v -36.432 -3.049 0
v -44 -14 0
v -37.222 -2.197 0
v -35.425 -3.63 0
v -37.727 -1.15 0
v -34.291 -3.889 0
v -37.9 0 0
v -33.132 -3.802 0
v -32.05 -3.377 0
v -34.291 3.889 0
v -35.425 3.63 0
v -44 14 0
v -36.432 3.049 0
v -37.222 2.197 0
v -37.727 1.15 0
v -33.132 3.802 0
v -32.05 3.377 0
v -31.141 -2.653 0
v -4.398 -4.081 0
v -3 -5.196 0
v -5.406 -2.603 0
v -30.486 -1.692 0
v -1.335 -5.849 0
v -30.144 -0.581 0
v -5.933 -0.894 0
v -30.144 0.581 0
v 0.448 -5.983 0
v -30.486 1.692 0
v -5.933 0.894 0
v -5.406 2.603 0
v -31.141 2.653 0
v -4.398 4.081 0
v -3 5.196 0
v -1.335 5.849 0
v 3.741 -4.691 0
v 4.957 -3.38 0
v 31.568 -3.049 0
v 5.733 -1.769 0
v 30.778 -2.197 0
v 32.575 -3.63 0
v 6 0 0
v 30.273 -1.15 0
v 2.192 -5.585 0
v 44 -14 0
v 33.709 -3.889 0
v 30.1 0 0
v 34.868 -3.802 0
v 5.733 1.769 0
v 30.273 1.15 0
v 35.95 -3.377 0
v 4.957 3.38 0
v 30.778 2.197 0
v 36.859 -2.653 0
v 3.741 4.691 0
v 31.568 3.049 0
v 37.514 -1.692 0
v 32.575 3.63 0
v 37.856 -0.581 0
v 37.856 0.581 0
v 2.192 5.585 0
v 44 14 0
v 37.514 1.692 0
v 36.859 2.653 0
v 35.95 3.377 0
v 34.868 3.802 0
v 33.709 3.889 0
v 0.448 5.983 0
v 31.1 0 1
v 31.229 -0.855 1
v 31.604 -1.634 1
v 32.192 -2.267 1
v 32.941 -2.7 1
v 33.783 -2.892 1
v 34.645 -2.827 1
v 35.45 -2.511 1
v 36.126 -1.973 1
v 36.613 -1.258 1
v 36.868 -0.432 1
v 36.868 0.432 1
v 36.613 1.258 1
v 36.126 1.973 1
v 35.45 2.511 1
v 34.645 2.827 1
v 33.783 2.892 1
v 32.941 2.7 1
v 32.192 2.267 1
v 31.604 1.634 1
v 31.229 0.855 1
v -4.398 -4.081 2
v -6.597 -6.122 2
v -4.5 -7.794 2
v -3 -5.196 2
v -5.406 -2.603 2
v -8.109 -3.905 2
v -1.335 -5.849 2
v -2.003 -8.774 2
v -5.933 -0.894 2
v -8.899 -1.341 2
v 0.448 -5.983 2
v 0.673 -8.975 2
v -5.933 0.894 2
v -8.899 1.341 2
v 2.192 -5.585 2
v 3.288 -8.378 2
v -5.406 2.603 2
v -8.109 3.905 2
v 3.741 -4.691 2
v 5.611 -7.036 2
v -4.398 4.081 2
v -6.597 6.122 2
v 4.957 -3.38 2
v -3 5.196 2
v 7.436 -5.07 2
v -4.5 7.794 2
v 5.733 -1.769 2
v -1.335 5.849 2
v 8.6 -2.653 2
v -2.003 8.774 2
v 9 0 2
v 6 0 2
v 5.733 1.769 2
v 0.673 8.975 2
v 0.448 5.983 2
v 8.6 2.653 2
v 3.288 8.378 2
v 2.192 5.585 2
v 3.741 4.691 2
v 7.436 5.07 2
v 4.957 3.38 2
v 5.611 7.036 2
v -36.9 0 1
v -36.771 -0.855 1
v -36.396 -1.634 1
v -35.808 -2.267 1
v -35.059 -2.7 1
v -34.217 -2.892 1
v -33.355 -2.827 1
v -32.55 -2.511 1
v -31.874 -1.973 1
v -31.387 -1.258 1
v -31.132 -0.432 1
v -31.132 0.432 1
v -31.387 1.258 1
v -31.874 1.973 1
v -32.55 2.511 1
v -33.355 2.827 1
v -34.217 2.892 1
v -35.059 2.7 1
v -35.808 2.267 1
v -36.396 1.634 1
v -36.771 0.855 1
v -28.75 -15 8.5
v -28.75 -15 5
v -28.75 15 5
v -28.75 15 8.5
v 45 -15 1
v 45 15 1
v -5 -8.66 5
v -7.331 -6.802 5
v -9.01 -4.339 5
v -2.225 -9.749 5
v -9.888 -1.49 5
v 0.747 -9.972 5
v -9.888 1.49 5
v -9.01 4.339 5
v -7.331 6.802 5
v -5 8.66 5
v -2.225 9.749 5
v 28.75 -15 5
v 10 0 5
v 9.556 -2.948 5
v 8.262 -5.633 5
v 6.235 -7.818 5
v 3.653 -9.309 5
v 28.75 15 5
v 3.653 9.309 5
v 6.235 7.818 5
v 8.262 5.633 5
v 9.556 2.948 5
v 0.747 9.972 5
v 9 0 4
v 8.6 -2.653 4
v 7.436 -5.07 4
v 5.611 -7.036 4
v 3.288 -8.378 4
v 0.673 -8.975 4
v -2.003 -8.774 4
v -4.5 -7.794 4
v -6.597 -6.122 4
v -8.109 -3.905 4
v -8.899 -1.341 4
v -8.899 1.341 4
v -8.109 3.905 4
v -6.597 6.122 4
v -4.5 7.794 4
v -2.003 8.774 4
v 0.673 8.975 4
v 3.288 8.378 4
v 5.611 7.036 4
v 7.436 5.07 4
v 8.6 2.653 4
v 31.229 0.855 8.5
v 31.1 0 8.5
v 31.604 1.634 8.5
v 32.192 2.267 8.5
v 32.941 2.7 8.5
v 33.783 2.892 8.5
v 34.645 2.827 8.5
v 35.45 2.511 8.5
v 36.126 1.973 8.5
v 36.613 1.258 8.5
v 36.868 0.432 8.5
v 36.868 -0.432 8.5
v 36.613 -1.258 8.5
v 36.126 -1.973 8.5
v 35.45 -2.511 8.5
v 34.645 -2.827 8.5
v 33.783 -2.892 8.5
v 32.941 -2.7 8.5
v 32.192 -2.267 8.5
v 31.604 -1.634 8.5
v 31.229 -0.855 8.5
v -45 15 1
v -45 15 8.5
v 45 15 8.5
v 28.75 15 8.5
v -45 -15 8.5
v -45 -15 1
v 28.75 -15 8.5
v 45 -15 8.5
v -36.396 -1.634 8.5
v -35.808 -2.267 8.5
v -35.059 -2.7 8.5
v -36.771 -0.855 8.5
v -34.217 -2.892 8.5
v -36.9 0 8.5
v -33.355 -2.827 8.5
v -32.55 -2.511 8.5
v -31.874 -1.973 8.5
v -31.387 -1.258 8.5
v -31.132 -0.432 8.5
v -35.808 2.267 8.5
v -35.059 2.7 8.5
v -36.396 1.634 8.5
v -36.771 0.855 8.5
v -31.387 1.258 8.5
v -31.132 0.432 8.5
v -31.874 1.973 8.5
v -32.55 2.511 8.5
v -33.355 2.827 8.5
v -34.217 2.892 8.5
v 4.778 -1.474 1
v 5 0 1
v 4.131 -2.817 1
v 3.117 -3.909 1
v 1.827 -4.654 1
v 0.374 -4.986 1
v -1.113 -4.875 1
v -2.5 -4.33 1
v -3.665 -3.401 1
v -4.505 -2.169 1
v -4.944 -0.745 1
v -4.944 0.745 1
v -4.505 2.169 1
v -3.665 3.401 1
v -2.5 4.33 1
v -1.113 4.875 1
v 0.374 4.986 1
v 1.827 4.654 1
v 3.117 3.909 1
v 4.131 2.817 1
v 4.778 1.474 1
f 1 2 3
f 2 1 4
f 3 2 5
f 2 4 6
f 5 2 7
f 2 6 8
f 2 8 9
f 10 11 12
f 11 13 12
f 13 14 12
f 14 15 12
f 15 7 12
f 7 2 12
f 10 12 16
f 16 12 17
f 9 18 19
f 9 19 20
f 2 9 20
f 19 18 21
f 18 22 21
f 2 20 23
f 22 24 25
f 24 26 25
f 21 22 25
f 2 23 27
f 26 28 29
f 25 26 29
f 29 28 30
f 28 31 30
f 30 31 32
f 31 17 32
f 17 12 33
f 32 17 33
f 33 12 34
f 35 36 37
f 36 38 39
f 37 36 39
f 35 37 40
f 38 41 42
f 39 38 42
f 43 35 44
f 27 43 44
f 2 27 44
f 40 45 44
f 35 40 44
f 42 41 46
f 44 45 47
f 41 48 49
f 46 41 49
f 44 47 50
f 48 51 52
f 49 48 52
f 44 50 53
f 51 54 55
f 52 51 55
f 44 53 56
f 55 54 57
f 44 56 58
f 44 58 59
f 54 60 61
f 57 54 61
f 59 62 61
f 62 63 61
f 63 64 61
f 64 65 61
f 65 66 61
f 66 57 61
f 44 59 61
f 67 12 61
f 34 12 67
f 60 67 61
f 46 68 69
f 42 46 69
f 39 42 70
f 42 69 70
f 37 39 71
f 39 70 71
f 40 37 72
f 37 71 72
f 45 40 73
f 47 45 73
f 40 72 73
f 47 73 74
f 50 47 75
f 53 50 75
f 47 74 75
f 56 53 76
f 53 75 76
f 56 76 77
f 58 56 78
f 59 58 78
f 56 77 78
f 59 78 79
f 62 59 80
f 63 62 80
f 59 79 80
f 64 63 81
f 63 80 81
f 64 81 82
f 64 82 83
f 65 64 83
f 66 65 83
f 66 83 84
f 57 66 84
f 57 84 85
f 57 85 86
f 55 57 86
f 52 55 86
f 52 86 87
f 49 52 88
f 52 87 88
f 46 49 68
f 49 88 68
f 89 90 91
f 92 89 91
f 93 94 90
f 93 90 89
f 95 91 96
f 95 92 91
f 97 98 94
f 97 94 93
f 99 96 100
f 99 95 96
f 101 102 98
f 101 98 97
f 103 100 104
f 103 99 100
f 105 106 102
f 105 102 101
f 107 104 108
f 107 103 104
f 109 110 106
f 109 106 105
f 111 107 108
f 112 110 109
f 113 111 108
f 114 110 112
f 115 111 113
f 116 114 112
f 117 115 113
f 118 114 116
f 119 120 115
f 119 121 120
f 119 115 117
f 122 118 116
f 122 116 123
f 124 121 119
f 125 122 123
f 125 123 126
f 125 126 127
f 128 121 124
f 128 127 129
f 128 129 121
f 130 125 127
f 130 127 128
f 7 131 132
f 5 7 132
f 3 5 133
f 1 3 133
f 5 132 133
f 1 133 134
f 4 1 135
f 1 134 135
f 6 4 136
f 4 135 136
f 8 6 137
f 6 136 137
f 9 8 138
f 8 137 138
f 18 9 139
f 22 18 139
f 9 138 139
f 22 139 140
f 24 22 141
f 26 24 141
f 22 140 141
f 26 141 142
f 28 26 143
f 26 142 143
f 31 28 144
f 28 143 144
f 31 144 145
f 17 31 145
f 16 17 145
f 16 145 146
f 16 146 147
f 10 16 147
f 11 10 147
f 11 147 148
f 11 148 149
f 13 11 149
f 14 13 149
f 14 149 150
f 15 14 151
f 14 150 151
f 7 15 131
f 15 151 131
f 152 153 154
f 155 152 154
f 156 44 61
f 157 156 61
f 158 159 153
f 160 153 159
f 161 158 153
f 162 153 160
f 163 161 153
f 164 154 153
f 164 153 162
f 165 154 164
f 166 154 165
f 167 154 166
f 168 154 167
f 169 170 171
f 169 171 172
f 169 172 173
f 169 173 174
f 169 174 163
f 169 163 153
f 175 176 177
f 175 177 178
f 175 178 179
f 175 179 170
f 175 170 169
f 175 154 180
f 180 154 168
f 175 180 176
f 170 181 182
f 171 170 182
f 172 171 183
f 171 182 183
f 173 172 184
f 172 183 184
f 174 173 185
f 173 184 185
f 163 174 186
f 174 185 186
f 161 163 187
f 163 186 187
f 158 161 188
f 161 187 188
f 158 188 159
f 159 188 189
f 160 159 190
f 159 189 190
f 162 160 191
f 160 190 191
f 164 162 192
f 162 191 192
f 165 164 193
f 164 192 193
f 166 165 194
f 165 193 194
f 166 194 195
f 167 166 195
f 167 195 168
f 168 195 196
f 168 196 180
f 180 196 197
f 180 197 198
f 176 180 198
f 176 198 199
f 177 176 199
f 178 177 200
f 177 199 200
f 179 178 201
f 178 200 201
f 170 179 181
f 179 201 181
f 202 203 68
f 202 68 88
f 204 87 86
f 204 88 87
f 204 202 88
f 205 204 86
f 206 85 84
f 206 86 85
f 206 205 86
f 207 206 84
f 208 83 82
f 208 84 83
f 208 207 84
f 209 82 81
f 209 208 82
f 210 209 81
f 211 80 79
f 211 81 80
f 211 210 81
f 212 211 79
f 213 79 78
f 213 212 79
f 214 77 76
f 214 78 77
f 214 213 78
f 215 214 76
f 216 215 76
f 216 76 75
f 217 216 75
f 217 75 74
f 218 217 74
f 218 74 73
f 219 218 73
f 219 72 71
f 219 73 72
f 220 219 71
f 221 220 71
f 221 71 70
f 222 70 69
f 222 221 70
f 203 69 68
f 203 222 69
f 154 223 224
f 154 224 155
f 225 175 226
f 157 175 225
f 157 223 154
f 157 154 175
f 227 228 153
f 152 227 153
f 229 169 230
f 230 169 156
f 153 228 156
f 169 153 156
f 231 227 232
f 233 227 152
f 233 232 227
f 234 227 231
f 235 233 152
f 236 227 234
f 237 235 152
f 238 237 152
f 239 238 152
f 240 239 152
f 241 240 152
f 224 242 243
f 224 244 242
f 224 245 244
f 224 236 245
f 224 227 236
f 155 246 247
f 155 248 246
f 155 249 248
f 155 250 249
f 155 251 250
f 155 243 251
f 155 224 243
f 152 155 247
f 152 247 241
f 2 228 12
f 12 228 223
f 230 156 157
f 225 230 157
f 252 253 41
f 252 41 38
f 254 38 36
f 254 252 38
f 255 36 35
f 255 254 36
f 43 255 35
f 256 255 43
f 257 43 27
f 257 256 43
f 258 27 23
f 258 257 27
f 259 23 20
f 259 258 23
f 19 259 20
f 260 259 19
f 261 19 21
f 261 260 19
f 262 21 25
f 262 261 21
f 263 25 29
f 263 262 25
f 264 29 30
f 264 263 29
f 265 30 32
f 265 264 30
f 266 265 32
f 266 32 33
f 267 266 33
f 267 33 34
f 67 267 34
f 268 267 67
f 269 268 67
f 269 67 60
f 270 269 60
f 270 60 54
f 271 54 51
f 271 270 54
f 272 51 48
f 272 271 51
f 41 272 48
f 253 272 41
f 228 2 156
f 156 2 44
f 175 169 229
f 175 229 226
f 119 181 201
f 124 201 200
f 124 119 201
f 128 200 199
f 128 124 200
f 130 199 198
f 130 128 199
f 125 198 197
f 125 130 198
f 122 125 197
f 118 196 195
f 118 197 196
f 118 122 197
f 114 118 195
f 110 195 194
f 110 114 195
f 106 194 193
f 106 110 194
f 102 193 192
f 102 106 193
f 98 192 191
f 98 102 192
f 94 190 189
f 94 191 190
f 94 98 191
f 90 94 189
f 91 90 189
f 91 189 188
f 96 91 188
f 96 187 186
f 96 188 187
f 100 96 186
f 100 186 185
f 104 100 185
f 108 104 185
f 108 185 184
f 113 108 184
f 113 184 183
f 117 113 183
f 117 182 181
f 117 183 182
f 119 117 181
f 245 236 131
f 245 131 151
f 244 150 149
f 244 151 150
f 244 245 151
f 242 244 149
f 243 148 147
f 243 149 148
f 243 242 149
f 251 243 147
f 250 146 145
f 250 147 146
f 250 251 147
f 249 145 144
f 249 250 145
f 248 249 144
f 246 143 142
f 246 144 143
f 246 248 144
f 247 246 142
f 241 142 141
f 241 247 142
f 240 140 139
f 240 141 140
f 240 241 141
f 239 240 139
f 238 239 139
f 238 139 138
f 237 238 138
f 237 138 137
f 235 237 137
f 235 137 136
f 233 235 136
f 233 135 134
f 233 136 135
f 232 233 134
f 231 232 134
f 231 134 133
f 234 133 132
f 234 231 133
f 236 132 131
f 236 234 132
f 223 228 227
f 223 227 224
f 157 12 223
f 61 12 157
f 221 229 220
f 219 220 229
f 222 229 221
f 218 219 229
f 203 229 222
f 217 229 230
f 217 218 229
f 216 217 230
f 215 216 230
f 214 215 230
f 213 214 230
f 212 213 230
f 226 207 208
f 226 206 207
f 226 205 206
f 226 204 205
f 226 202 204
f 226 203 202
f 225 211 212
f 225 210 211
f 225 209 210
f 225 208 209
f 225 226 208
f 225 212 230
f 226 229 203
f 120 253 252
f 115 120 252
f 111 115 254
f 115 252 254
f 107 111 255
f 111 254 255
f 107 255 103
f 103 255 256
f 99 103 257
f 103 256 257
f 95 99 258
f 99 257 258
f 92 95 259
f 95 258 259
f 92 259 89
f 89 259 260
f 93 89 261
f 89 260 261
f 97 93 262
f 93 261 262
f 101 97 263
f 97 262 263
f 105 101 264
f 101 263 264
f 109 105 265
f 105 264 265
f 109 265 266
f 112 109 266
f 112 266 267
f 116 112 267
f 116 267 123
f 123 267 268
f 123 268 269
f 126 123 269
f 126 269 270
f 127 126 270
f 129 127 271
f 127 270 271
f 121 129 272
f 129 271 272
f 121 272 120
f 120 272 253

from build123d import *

# Parameters (mm, degrees)
SKETCH_1_W               = 90
SKETCH_1_H               = 30
EXTRUDE_1_DEPTH          = 5
SKETCH_2_W               = 16.25
SKETCH_2_H               = 30
EXTRUDE_2_DEPTH          = 3.5
CUT_EXTRUDE_1_DEPTH      = 49.189729196
CUT_EXTRUDE_1_DEPTH_BACK = 49.189729196
SKETCH_3_R               = 2.9
CHAMFER_1_SIZE           = 1
CUT_EXTRUDE_2_DEPTH      = 48.696960071
CUT_EXTRUDE_2_DEPTH_BACK = 3
SKETCH_4_R               = 9
CHAMFER_2_SIZE           = 1
CUT_EXTRUDE_3_DEPTH      = 48.877447718
CUT_EXTRUDE_3_DEPTH_BACK = 48.877447718
SKETCH_5_R               = 5
CHAMFER_3_SIZE           = 1


with BuildPart() as part:
    # 草图1 → 凸台-拉伸1 (new body)
    with BuildSketch(Plane.XY):
        Rectangle(SKETCH_1_W, SKETCH_1_H)
    extrude(amount=EXTRUDE_1_DEPTH)

    # 草图2 → 凸台-拉伸2 (add)
    with BuildSketch(Plane.XY.offset(5)):
        with Locations((36.875, 0)):
            Rectangle(SKETCH_2_W, SKETCH_2_H)
        with Locations((-36.875, 0)):
            Rectangle(SKETCH_2_W, SKETCH_2_H)
    extrude(amount=EXTRUDE_2_DEPTH)

    # 草图3 → 切除-拉伸1 (cut, two sides: drawn at the far end of the back side and taken through both)
    with BuildSketch(Plane(origin=(0, 0, 0), x_dir=(-1, 0, 0), z_dir=(0, 0, -1)).offset(-CUT_EXTRUDE_1_DEPTH_BACK)):
        with Locations((34, 0)):
            Circle(SKETCH_3_R)
        with Locations((-34, 0)):
            Circle(SKETCH_3_R)
    extrude(amount=CUT_EXTRUDE_1_DEPTH + CUT_EXTRUDE_1_DEPTH_BACK, mode=Mode.SUBTRACT)

    # 倒角1
    chamfer_1_edges = [part.edges().sort_by_distance(p)[0] for p in [
        (-31.1, 0, 0),
        (36.9, 0, 0),
        (0, 15, 0),
        (45, 0, 0),
        (0, -15, 0),
        (-45, 0, 0),
    ]]
    chamfer(chamfer_1_edges, length=CHAMFER_1_SIZE)

    # 草图4 → 切除-拉伸2 (cut, two sides: drawn at the far end of the back side and taken through both)
    with BuildSketch(Plane.XY.offset(5).offset(-CUT_EXTRUDE_2_DEPTH_BACK)):
        Circle(SKETCH_4_R)
    extrude(amount=CUT_EXTRUDE_2_DEPTH + CUT_EXTRUDE_2_DEPTH_BACK, mode=Mode.SUBTRACT)

    # 倒角2
    chamfer_2_edges = [part.edges().sort_by_distance(p)[0] for p in [
        (-9, 0, 5),
    ]]
    chamfer(chamfer_2_edges, length=CHAMFER_2_SIZE)

    # 草图5 → 切除-拉伸3 (cut, two sides: drawn at the far end of the back side and taken through both)
    with BuildSketch(Plane.XY.offset(2).offset(-CUT_EXTRUDE_3_DEPTH_BACK)):
        Circle(SKETCH_5_R)
    extrude(amount=CUT_EXTRUDE_3_DEPTH + CUT_EXTRUDE_3_DEPTH_BACK, mode=Mode.SUBTRACT)

    # 倒角3
    chamfer_3_edges = [part.edges().sort_by_distance(p)[0] for p in [
        (-5, 0, 2),
        (-5, 0, 0),
    ]]
    chamfer(chamfer_3_edges, length=CHAMFER_3_SIZE - 0.0001)  # a hair under: the kernel refuses the full size


solid = part.part
